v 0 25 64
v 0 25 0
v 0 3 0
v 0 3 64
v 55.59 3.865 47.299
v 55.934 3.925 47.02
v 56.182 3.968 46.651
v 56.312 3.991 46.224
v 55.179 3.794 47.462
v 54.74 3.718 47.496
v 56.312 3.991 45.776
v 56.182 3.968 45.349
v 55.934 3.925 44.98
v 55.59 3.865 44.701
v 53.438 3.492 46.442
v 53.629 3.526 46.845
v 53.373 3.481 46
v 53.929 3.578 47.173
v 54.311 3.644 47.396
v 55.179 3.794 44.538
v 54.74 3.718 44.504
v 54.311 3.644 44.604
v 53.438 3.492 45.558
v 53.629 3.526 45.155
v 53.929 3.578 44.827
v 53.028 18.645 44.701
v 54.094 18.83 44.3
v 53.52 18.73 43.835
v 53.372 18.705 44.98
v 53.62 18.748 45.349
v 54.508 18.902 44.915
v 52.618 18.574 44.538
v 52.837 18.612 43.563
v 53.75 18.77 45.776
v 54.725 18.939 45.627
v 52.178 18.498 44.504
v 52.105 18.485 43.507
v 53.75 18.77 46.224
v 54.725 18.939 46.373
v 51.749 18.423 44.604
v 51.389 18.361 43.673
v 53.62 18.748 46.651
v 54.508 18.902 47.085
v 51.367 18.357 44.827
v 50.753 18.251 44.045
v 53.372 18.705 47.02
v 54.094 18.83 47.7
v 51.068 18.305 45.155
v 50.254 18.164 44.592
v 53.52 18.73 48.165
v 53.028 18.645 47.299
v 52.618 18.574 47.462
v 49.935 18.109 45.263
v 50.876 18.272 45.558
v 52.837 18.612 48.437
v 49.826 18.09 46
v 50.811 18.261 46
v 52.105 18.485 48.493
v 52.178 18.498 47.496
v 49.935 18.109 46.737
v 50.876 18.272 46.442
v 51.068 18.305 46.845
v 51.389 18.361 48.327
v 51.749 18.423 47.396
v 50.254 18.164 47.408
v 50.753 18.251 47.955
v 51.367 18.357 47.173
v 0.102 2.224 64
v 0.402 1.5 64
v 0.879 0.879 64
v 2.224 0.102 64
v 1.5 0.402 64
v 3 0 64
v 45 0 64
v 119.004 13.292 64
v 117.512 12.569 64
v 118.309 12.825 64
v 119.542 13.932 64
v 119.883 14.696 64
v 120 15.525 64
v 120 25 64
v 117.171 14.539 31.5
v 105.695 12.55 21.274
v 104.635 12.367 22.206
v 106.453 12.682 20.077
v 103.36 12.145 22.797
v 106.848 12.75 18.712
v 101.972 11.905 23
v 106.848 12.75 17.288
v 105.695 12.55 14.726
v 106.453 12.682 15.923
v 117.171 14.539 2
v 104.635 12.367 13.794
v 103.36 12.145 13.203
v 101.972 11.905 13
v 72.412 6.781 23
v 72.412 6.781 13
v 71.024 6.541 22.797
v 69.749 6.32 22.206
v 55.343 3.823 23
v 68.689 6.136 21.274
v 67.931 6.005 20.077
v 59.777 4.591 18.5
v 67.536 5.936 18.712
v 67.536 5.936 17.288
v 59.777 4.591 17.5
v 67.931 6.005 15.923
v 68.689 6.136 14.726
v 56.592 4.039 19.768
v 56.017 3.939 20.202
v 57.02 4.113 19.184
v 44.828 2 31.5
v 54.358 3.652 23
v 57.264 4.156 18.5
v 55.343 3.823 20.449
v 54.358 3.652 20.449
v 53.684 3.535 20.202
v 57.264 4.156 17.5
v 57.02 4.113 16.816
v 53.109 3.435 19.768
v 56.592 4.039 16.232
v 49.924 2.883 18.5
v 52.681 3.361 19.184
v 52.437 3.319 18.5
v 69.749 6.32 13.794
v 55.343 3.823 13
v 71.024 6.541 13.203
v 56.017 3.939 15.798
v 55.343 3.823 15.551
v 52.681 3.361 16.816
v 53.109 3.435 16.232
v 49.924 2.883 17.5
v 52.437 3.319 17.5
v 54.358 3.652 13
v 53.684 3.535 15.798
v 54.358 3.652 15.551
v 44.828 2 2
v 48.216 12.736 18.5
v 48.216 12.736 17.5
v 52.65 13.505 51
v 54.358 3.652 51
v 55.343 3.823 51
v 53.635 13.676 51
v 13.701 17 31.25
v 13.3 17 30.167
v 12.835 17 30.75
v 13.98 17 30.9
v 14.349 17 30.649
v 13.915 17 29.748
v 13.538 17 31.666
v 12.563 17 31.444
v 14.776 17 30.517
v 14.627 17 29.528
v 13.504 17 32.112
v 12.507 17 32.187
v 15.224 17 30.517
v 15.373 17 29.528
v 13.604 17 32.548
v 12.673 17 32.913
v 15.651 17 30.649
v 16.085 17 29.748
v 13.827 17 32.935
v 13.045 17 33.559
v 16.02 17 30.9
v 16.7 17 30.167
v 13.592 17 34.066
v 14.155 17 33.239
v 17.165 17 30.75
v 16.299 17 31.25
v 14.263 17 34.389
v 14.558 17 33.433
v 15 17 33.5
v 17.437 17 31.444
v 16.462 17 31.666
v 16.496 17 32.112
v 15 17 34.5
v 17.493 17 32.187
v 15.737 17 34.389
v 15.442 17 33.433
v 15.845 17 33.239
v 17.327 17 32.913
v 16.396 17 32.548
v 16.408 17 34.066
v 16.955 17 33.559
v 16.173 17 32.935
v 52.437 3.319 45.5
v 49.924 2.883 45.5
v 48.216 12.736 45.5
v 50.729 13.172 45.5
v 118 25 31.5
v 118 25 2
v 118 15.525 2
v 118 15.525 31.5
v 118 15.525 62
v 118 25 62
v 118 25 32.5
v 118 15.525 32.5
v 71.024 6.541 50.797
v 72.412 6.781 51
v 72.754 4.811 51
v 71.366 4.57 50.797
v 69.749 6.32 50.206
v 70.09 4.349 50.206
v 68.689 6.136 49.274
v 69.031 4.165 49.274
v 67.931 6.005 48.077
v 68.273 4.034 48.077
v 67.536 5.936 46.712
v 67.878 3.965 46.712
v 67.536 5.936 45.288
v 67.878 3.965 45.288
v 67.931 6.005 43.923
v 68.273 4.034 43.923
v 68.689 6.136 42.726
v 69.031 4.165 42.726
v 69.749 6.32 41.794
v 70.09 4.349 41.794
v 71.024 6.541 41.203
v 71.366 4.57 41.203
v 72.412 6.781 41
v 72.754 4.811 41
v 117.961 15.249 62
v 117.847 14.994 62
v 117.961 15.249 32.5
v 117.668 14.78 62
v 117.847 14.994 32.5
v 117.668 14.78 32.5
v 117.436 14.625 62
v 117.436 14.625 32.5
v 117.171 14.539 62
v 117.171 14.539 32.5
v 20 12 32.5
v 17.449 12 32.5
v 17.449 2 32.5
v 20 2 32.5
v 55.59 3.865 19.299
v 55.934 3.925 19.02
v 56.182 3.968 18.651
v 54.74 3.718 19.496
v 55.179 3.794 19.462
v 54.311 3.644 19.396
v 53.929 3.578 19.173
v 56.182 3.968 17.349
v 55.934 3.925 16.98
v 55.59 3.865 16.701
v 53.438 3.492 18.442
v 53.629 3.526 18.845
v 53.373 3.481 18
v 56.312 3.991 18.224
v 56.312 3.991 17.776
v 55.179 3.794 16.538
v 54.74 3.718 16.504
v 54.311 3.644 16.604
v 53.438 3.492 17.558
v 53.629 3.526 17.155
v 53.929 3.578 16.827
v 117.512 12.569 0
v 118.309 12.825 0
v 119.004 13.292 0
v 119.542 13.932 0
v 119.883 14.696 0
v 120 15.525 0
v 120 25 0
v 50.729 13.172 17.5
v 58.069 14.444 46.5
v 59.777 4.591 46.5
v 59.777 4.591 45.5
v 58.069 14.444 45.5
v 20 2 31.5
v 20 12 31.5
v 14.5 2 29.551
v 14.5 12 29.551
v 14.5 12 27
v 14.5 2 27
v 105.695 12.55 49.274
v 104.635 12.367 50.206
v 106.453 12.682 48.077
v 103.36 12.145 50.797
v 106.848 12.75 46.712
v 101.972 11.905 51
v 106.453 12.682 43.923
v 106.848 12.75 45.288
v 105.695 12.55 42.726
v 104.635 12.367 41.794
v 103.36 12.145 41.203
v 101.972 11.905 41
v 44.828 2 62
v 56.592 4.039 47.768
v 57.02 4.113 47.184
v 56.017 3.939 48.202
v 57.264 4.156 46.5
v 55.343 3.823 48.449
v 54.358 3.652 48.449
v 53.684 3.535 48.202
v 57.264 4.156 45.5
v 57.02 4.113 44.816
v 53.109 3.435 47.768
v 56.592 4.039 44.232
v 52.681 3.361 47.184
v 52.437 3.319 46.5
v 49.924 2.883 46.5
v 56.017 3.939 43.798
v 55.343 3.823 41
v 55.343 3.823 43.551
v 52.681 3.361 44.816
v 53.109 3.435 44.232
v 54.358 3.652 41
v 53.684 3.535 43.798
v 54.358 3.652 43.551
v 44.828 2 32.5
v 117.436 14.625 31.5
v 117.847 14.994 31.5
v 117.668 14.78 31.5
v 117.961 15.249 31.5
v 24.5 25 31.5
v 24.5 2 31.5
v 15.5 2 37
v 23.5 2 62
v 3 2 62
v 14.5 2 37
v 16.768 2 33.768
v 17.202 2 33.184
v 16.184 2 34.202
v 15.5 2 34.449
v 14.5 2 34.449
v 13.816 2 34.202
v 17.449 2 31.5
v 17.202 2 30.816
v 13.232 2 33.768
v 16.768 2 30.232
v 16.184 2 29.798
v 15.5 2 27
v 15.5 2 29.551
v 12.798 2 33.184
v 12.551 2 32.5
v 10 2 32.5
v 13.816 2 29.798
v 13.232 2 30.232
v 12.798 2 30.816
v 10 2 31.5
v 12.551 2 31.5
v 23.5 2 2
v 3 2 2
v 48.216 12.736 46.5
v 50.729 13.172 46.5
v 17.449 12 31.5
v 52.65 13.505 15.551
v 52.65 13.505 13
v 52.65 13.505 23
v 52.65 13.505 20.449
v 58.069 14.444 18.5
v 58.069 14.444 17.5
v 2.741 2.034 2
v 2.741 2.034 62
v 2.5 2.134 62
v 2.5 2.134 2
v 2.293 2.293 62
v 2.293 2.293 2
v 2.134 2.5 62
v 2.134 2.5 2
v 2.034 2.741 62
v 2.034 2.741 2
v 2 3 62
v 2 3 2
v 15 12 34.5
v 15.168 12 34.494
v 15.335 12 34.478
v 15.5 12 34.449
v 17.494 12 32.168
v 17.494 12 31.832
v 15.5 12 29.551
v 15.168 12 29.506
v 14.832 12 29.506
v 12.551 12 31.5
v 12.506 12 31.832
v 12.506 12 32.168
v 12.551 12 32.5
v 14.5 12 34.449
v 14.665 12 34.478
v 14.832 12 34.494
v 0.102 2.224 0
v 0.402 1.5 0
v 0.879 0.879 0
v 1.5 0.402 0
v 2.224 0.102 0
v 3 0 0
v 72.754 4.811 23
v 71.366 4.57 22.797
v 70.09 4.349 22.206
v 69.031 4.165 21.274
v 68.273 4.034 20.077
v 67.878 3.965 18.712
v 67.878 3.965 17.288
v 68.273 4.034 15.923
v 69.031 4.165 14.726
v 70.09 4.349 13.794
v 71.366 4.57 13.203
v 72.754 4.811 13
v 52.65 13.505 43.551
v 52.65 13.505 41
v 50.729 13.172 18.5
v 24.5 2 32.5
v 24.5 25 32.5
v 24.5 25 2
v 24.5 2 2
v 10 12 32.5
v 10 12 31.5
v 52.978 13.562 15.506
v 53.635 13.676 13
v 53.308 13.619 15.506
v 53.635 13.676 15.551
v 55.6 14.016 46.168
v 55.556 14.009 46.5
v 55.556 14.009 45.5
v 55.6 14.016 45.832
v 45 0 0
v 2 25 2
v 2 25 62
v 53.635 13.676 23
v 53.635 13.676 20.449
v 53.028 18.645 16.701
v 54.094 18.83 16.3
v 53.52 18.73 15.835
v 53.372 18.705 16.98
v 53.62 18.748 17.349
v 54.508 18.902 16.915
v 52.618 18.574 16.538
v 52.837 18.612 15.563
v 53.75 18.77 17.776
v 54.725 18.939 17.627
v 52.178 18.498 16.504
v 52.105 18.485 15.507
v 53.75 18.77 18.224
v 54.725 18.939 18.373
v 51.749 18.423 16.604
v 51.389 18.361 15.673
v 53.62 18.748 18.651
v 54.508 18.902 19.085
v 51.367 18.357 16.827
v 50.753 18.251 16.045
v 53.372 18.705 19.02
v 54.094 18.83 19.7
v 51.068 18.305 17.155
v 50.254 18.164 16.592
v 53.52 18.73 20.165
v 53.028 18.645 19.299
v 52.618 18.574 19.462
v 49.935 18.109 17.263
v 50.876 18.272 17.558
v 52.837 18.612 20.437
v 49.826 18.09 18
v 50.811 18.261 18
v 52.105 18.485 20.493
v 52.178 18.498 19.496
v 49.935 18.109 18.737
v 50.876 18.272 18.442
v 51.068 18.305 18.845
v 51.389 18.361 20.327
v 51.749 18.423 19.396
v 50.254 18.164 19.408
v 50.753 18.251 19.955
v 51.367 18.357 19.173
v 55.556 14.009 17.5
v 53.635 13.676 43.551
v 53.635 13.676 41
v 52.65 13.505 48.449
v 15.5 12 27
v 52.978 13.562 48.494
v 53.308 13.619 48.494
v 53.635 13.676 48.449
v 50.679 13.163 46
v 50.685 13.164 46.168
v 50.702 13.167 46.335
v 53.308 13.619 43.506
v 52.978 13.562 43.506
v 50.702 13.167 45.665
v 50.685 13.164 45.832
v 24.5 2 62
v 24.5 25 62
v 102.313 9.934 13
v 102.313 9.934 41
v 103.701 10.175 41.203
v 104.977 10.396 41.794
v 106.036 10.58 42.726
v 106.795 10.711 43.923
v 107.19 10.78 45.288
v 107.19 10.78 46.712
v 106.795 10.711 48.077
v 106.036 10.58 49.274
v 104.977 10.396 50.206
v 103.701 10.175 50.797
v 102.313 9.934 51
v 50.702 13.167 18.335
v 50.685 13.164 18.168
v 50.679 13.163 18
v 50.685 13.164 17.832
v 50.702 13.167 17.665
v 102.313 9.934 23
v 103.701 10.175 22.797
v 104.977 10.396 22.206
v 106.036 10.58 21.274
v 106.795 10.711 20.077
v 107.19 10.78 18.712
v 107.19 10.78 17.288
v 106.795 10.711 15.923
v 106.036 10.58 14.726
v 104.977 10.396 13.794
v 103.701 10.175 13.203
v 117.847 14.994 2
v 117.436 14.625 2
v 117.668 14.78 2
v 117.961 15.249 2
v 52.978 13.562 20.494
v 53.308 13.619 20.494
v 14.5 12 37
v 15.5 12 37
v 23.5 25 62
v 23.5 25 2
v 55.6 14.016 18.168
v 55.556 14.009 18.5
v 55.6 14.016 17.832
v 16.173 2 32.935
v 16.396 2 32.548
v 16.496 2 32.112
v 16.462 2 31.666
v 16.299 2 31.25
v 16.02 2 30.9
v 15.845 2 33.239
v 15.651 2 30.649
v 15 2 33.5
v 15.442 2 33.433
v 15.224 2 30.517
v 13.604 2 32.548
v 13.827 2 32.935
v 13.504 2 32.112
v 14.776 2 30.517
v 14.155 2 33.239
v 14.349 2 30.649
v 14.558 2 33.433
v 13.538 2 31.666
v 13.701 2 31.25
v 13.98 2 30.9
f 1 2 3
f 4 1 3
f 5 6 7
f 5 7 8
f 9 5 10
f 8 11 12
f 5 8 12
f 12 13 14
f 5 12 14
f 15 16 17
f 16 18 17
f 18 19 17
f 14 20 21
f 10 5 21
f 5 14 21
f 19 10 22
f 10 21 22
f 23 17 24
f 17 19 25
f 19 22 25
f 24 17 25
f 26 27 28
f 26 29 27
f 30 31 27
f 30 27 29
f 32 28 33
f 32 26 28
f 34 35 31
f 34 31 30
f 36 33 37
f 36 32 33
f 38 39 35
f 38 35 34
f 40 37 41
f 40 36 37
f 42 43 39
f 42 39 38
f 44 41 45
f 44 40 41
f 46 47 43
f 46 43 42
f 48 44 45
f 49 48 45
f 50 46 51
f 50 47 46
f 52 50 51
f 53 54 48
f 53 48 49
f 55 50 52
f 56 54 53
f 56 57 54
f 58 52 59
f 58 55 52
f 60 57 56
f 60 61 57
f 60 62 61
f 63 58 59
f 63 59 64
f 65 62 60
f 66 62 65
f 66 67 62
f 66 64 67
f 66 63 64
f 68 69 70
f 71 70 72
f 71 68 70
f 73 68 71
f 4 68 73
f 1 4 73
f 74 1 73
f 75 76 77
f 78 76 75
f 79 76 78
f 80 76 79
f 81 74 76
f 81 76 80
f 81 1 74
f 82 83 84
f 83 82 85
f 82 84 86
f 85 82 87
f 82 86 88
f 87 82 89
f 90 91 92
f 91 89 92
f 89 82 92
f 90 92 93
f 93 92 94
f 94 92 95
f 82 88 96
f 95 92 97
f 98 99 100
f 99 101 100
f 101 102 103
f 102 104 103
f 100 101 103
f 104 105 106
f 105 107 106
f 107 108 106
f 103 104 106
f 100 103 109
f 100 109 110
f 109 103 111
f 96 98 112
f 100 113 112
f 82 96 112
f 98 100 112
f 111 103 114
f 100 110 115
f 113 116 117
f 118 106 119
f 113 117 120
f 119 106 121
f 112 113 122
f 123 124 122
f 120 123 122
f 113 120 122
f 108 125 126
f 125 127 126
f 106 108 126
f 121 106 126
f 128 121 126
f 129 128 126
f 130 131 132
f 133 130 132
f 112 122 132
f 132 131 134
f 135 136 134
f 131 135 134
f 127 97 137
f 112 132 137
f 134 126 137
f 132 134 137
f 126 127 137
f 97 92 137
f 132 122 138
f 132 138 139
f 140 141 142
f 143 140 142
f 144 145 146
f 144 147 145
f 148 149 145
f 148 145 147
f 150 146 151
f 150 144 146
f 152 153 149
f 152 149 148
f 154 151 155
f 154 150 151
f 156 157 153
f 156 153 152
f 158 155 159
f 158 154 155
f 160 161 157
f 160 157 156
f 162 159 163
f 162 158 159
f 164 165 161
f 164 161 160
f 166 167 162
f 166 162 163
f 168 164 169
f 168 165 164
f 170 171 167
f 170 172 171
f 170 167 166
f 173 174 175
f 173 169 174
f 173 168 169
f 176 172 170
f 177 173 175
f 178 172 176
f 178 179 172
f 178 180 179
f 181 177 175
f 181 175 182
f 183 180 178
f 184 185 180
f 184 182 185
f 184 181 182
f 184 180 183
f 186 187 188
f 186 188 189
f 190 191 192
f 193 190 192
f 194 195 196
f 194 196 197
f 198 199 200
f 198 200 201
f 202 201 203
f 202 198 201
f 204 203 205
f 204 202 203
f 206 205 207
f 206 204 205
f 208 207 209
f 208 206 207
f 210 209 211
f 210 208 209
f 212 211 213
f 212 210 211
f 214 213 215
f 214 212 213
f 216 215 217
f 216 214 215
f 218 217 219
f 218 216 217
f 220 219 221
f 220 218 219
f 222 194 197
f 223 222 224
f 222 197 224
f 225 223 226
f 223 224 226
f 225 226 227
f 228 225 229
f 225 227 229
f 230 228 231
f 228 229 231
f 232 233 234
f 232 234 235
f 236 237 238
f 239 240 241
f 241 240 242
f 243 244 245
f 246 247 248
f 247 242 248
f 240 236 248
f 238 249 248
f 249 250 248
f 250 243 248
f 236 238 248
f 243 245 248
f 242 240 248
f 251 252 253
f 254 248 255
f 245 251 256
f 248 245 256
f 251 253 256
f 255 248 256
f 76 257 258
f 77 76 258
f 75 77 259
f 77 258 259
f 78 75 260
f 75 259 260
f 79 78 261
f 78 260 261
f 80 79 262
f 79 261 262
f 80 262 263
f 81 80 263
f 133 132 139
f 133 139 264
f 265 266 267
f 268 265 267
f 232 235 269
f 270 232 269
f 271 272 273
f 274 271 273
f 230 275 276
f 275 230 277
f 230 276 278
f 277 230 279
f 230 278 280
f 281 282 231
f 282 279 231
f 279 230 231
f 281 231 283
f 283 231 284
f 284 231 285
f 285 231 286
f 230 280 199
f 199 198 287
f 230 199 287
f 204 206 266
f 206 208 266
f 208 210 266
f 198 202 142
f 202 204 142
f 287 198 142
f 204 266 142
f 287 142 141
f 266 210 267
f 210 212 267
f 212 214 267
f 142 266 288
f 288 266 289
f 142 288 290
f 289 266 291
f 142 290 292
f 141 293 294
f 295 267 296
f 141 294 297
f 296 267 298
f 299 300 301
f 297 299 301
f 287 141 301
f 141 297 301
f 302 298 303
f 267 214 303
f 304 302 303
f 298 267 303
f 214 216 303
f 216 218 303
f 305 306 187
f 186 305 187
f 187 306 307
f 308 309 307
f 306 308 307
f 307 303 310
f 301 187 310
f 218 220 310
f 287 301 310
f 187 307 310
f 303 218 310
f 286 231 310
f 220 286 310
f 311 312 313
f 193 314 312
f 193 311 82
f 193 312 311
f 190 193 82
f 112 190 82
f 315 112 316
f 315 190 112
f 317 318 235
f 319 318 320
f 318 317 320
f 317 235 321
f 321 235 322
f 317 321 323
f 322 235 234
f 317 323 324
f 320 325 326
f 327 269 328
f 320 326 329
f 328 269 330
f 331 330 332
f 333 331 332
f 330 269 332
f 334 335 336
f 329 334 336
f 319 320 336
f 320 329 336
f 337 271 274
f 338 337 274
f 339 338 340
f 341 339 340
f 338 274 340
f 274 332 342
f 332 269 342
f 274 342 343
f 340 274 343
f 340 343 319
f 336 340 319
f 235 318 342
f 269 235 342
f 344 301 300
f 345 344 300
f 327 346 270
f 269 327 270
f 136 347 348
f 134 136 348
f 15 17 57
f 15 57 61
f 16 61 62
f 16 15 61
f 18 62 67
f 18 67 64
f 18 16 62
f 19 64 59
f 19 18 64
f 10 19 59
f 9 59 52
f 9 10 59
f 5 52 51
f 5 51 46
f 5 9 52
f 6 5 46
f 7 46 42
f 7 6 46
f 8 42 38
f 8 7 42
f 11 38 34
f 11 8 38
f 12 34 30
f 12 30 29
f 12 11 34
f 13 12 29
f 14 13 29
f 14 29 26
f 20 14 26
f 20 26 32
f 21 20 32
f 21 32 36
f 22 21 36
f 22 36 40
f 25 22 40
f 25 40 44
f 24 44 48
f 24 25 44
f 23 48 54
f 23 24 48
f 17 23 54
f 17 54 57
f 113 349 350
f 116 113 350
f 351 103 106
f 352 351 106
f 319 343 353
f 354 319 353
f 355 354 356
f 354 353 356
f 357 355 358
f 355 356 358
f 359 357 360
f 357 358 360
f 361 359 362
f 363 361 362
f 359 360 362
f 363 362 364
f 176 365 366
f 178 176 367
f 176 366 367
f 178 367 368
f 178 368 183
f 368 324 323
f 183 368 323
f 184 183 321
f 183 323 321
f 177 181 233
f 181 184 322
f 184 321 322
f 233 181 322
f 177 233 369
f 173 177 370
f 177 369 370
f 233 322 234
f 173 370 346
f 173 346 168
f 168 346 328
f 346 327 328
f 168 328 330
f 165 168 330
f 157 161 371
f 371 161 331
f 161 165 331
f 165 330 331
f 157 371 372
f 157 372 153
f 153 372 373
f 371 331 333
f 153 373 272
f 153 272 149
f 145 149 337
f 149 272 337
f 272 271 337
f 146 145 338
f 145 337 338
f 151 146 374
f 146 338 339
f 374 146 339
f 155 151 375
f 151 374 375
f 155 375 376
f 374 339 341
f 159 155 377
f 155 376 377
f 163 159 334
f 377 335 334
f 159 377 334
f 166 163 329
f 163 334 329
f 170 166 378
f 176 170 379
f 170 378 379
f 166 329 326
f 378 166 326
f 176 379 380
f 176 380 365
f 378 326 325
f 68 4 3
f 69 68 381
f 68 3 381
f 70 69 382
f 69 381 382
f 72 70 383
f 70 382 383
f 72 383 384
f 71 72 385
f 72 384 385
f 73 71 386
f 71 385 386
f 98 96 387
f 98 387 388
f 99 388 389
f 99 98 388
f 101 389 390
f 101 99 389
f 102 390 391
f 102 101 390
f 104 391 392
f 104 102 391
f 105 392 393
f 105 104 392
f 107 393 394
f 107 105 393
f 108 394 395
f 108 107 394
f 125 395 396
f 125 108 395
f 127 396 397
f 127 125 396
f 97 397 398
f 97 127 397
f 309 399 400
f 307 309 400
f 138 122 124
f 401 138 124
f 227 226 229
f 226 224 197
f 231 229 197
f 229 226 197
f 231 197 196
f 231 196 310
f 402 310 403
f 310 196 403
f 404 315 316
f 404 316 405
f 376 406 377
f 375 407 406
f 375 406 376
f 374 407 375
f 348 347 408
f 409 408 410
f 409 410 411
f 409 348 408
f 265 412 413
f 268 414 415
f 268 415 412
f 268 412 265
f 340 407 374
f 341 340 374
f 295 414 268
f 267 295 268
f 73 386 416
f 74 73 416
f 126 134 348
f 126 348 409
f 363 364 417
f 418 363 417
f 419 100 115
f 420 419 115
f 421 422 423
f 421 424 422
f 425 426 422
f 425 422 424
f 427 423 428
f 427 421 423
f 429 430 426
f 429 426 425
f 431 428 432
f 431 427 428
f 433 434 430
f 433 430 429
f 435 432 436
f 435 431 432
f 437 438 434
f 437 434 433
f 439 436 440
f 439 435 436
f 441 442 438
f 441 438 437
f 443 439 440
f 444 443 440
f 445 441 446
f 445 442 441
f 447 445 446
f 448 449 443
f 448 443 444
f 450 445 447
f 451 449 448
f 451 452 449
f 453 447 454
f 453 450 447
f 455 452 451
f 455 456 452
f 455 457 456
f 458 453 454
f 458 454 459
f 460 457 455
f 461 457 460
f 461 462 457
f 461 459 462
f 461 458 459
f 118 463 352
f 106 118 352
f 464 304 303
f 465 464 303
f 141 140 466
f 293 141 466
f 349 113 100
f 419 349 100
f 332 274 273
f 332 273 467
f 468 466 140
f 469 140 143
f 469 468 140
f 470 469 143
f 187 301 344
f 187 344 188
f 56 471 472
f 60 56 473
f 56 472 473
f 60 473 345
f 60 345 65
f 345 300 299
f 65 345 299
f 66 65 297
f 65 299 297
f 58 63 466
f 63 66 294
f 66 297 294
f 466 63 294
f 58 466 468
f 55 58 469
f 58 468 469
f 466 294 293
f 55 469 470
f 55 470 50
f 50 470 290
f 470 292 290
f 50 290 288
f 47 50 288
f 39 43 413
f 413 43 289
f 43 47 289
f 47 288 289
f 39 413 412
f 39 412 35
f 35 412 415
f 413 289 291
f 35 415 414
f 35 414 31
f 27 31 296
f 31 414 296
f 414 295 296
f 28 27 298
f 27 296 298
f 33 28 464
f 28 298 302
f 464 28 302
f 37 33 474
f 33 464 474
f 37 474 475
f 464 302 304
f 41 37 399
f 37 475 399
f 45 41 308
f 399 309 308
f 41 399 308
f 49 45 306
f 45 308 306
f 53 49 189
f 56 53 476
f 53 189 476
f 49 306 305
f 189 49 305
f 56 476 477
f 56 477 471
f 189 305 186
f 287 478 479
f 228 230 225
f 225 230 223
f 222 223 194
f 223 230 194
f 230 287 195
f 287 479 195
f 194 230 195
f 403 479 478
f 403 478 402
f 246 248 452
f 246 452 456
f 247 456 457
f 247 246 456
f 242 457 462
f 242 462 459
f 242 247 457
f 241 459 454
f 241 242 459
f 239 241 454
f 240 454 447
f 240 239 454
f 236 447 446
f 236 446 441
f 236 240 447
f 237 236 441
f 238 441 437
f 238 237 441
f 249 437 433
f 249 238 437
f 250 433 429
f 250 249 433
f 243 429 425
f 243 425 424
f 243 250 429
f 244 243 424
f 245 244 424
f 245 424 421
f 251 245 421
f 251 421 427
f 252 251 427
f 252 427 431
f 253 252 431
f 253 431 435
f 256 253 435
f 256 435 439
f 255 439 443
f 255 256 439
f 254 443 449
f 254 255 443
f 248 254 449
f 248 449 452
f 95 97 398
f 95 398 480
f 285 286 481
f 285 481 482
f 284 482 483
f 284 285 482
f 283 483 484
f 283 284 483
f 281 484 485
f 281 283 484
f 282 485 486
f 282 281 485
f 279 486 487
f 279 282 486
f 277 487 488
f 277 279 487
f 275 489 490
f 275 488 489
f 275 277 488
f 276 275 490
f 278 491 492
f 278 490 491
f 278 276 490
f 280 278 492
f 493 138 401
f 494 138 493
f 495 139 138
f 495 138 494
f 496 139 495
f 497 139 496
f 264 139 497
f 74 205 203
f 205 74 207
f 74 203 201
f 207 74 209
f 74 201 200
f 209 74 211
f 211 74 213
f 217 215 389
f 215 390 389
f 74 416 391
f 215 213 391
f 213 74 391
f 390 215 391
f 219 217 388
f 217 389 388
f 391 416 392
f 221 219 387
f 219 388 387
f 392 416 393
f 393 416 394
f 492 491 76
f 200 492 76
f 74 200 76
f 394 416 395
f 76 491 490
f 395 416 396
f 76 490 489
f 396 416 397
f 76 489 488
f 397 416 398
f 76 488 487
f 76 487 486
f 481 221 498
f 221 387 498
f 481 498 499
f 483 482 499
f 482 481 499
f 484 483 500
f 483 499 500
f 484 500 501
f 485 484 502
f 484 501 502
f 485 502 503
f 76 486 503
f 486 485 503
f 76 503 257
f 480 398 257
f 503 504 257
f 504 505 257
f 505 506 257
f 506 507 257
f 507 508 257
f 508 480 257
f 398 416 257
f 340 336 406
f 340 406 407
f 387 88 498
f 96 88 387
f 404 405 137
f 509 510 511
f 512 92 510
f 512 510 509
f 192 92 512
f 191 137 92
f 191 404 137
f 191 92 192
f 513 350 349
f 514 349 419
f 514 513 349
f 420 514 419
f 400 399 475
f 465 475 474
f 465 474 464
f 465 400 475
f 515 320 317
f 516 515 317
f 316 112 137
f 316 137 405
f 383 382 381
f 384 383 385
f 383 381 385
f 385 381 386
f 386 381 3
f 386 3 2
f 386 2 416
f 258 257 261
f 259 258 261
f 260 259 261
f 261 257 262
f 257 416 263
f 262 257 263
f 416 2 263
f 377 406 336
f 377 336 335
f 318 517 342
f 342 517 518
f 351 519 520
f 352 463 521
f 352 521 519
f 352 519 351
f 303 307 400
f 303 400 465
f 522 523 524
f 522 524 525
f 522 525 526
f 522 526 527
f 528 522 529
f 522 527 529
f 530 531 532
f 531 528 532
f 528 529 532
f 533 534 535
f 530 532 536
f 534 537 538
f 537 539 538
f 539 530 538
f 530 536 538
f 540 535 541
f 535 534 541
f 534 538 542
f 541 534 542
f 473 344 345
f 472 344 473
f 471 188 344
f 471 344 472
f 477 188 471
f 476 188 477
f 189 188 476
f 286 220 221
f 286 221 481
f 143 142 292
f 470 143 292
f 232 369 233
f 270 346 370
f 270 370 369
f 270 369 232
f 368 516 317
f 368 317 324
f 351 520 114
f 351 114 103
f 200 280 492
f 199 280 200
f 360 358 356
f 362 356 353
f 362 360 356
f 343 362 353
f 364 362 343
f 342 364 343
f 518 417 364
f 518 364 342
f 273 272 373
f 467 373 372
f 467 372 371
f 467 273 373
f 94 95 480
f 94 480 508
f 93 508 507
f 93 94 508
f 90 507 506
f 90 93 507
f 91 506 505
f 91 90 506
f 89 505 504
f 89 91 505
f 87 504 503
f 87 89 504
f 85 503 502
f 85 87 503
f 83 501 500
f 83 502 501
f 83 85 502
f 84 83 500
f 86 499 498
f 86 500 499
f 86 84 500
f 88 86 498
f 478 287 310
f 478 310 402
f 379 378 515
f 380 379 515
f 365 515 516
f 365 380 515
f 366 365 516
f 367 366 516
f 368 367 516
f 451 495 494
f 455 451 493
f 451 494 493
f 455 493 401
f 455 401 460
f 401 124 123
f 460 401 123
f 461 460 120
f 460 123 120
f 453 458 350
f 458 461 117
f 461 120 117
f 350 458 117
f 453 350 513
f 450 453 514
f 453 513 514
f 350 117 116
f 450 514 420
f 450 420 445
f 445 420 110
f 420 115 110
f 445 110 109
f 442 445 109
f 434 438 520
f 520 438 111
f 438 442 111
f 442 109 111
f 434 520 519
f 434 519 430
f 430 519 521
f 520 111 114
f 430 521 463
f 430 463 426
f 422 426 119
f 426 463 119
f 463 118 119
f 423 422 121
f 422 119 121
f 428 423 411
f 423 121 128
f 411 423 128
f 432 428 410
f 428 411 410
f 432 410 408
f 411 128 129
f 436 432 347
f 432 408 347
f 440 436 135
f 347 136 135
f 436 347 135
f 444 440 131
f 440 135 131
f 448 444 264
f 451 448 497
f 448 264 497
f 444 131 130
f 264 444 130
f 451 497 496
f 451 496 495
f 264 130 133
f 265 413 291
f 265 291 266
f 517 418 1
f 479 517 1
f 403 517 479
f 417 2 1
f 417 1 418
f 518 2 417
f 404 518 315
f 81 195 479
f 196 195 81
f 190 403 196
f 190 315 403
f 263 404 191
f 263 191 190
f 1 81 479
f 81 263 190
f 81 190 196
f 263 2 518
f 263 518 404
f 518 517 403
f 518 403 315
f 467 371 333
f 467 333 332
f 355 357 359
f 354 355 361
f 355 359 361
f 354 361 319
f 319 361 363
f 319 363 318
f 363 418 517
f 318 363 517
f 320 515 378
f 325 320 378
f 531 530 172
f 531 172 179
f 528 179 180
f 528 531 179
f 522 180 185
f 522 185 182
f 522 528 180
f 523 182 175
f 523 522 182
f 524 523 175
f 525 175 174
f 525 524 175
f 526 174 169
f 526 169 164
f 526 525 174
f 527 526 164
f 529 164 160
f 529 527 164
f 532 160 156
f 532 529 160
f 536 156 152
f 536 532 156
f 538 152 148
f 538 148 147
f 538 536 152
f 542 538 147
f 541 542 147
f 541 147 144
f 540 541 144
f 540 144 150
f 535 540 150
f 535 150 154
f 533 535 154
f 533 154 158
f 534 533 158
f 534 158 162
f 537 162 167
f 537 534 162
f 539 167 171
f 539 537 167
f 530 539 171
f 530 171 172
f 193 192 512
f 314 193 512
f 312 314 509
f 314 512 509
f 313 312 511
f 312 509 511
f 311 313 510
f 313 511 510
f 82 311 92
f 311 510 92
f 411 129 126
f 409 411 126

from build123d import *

# Parameters (mm, degrees)
EXTRUDE_THIN2_DEPTH = 64
RIB1_REACH          = 140.279
SKETCH2_WALL_W      = 394.557408146
SKETCH2_WALL_H      = 2
RIB2_REACH          = 139.364
SKETCH3_WALL_W      = 392.728957338
SKETCH3_WALL_H      = 2
CUT_EXTRUDE1_DEPTH  = 10
RIB9_REACH          = 120.055
SKETCH12_WALL_W     = 298.110143788
SKETCH12_WALL_H     = 1
RIB10_REACH         = 128.685
SKETCH13_WALL_W     = 348.869295694
SKETCH13_WALL_H     = 1
SKETCH14_R          = 2.5
SKETCH14_R_2        = 1.5
BOSS_EXTRUDE1_DEPTH = 15
SKETCH15_W          = 1
SKETCH15_H          = 2.550510257
SKETCH15_W_2        = 2.550510257
SKETCH15_H_2        = 1
BOSS_EXTRUDE2_DEPTH = 10
SKETCH16_R          = 2.5
SKETCH16_R_2        = 1.5
BOSS_EXTRUDE3_DEPTH = 15
SKETCH17_W          = 1
SKETCH17_H          = 2.550510257
SKETCH17_W_2        = 2.550510257
SKETCH17_H_2        = 1
BOSS_EXTRUDE4_DEPTH = 10
SKETCH18_W          = 1
SKETCH18_H          = 2.550510257
SKETCH18_W_2        = 2.550510257
SKETCH18_H_2        = 1
BOSS_EXTRUDE5_DEPTH = 10


with BuildPart() as part:
    # Sketch1 → Extrude-Thin2 (new body)
    with BuildSketch(Plane.XY):
        with BuildLine():
            Line((0, 25), (0, 3))
            ThreePointArc((0, 3), (0.878679656, 0.878679656), (3, 0))
            Line((3, 0), (45, 0))
            Line((45, 0), (117.512360171, 12.568809096))
            ThreePointArc((117.512360171, 12.568809096), (119.295330097, 13.593034489), (120, 15.524733157))
            Line((120, 15.524733157), (120, 25))
            Line((120, 25), (118, 25))
            Line((118, 25), (118, 15.524733157))
            ThreePointArc((118, 15.524733157), (117.765110032, 14.880833601), (117.170786724, 14.539425137))
            Line((117.170786724, 14.539425137), (44.827949394, 2))
            Line((44.827949394, 2), (3, 2))
            ThreePointArc((3, 2), (2.292893219, 2.292893219), (2, 3))
            Line((2, 3), (2, 25))
            Line((2, 25), (0, 25))
        make_face()
    extrude(amount=EXTRUDE_THIN2_DEPTH)

    # Sketch2 wall → Rib1 (add, up to next)
    with BuildSketch(Plane(origin=(60, 25, 0), x_dir=(1, 0, 0), z_dir=(0, 1, 0)), mode=Mode.PRIVATE) as rib1_sk1:
        with Locations((0, -1)):
            Rectangle(SKETCH2_WALL_W, SKETCH2_WALL_H)
    rib1_tool1 = extrude(rib1_sk1.sketch, amount=-RIB1_REACH, mode=Mode.PRIVATE) - part.part
    add(rib1_tool1.solids().sort_by_distance((60, 25, 0))[0])

    # Sketch3 wall → Rib2 (add, up to next)
    with BuildSketch(Plane(origin=(60, 25, 62), x_dir=(1, 0, 0), z_dir=(0, 1, 0)), mode=Mode.PRIVATE) as rib2_sk1:
        with Locations((0, -1)):
            Rectangle(SKETCH3_WALL_W, SKETCH3_WALL_H)
    rib2_tool1 = extrude(rib2_sk1.sketch, amount=-RIB2_REACH, mode=Mode.PRIVATE) - part.part
    add(rib2_tool1.solids().sort_by_distance((60, 25, 62))[0])

    # Sketch8 → Cut-Extrude1 (cut)
    with BuildSketch(Plane(origin=(0.970991275, -5.601872741, 0), x_dir=(0.9853080203996408, 0.17078672353593802, 0), z_dir=(-0.17078672353593802, 0.9853080203996408, 0))):
        with BuildLine():
            Line((72.506630536, -13), (102.506630536, -13))
            ThreePointArc((102.506630536, -13), (107.506630536, -18), (102.506630536, -23))
            Line((102.506630536, -23), (72.506630536, -23))
            ThreePointArc((72.506630536, -23), (67.506630536, -18), (72.506630536, -13))
        make_face()
        with BuildLine():
            Line((72.506630536, -41), (102.506630536, -41))
            ThreePointArc((102.506630536, -41), (107.506630536, -46), (102.506630536, -51))
            Line((102.506630536, -51), (72.506630536, -51))
            ThreePointArc((72.506630536, -51), (67.506630536, -46), (72.506630536, -41))
        make_face()
    extrude(amount=-CUT_EXTRUDE1_DEPTH, mode=Mode.SUBTRACT)

    # Sketch12 wall → Rib9 (add, up to next)
    with BuildSketch(Plane(origin=(24, 25, 32), x_dir=(0, 0, -1), z_dir=(0, 1, 0)), mode=Mode.PRIVATE) as rib9_sk1:
        Rectangle(SKETCH12_WALL_W, SKETCH12_WALL_H)
    rib9_tool1 = extrude(rib9_sk1.sketch, amount=-RIB9_REACH, mode=Mode.PRIVATE) - part.part
    add(rib9_tool1.solids().sort_by_distance((24, 25, 32))[0])

    # Sketch13 wall → Rib10 (add, up to next)
    with BuildSketch(Plane(origin=(71.25, 25, 32), x_dir=(-1, 0, 0), z_dir=(0, 1, 0)), mode=Mode.PRIVATE) as rib10_sk1:
        Rectangle(SKETCH13_WALL_W, SKETCH13_WALL_H)
    rib10_tool1 = extrude(rib10_sk1.sketch, amount=-RIB10_REACH, mode=Mode.PRIVATE) - part.part
    add(rib10_tool1.solids().sort_by_distance((71.25, 25, 32))[0])

    # Sketch14 → Boss-Extrude1 (add)
    with BuildSketch(Plane(origin=(0, 2, 0), x_dir=(1, 0, 0), z_dir=(0, 1, 0))):
        with Locations(Location((15, -32, 0), (0, 0, 270))):
            Circle(SKETCH14_R)
        with Locations(Location((15, -32, 0), (0, 0, 270))):
            Circle(SKETCH14_R_2, mode=Mode.SUBTRACT)
    extrude(amount=BOSS_EXTRUDE1_DEPTH)

    # Sketch15 → Boss-Extrude2 (add)
    with BuildSketch(Plane(origin=(0, 2, 0), x_dir=(1, 0, 0), z_dir=(0, 1, 0))):
        with Locations((15, -28.275255128)):
            Rectangle(SKETCH15_W, SKETCH15_H)
        with Locations((11.275255128, -32)):
            Rectangle(SKETCH15_W_2, SKETCH15_H_2)
        with Locations((15, -35.724744872)):
            Rectangle(SKETCH15_W, SKETCH15_H)
        with Locations((18.724744872, -32)):
            Rectangle(SKETCH15_W_2, SKETCH15_H_2)
    extrude(amount=BOSS_EXTRUDE2_DEPTH)

    # Sketch16 → Boss-Extrude3 (add)
    # profile 1 of 2: a face of its own
    with BuildSketch(Plane(origin=(0.970991275, -5.601872741, 0), x_dir=(0.9853080203996408, 0.17078672353593802, 0), z_dir=(-0.17078672353593802, 0.9853080203996408, 0))):
        with Locations(Location((54.682994606, -18, 0), (0, 0, 180))):
            Circle(SKETCH16_R)
        with Locations(Location((54.682994606, -18, 0), (0, 0, 180))):
            Circle(SKETCH16_R_2, mode=Mode.SUBTRACT)
    # profile 2 of 2: a face of its own
    with BuildSketch(Plane(origin=(0.970991275, -5.601872741, 0), x_dir=(0.9853080203996408, 0.17078672353593802, 0), z_dir=(-0.17078672353593802, 0.9853080203996408, 0))):
        with Locations(Location((54.682994606, -46, 0), (0, 0, 180))):
            Circle(SKETCH16_R)
        with Locations(Location((54.682994606, -46, 0), (0, 0, 180))):
            Circle(SKETCH16_R_2, mode=Mode.SUBTRACT)
    extrude(amount=BOSS_EXTRUDE3_DEPTH)

    # Sketch17 → Boss-Extrude4 (add)
    with BuildSketch(Plane(origin=(0.970991275, -5.601872741, 0), x_dir=(0.9853080203996408, 0.17078672353593802, 0), z_dir=(-0.17078672353593802, 0.9853080203996408, 0))):
        with Locations((54.682994606, -14.275255128)):
            Rectangle(SKETCH17_W, SKETCH17_H)
        with Locations((58.407739478, -18)):
            Rectangle(SKETCH17_W_2, SKETCH17_H_2)
        with Locations((54.682994606, -21.724744872)):
            Rectangle(SKETCH17_W, SKETCH17_H)
        with Locations((50.958249735, -18)):
            Rectangle(SKETCH17_W_2, SKETCH17_H_2)
    extrude(amount=BOSS_EXTRUDE4_DEPTH)

    # Sketch18 → Boss-Extrude5 (add)
    with BuildSketch(Plane(origin=(0.970991275, -5.601872741, 0), x_dir=(0.9853080203996408, 0.17078672353593802, 0), z_dir=(-0.17078672353593802, 0.9853080203996408, 0))):
        with Locations((54.682994606, -42.275255129)):
            Rectangle(SKETCH18_W, SKETCH18_H)
        with Locations((58.407739478, -46)):
            Rectangle(SKETCH18_W_2, SKETCH18_H_2)
        with Locations((54.682994606, -49.724744872)):
            Rectangle(SKETCH18_W, SKETCH18_H)
        with Locations((50.958249735, -46)):
            Rectangle(SKETCH18_W_2, SKETCH18_H_2)
    extrude(amount=BOSS_EXTRUDE5_DEPTH)


solid = part.part
